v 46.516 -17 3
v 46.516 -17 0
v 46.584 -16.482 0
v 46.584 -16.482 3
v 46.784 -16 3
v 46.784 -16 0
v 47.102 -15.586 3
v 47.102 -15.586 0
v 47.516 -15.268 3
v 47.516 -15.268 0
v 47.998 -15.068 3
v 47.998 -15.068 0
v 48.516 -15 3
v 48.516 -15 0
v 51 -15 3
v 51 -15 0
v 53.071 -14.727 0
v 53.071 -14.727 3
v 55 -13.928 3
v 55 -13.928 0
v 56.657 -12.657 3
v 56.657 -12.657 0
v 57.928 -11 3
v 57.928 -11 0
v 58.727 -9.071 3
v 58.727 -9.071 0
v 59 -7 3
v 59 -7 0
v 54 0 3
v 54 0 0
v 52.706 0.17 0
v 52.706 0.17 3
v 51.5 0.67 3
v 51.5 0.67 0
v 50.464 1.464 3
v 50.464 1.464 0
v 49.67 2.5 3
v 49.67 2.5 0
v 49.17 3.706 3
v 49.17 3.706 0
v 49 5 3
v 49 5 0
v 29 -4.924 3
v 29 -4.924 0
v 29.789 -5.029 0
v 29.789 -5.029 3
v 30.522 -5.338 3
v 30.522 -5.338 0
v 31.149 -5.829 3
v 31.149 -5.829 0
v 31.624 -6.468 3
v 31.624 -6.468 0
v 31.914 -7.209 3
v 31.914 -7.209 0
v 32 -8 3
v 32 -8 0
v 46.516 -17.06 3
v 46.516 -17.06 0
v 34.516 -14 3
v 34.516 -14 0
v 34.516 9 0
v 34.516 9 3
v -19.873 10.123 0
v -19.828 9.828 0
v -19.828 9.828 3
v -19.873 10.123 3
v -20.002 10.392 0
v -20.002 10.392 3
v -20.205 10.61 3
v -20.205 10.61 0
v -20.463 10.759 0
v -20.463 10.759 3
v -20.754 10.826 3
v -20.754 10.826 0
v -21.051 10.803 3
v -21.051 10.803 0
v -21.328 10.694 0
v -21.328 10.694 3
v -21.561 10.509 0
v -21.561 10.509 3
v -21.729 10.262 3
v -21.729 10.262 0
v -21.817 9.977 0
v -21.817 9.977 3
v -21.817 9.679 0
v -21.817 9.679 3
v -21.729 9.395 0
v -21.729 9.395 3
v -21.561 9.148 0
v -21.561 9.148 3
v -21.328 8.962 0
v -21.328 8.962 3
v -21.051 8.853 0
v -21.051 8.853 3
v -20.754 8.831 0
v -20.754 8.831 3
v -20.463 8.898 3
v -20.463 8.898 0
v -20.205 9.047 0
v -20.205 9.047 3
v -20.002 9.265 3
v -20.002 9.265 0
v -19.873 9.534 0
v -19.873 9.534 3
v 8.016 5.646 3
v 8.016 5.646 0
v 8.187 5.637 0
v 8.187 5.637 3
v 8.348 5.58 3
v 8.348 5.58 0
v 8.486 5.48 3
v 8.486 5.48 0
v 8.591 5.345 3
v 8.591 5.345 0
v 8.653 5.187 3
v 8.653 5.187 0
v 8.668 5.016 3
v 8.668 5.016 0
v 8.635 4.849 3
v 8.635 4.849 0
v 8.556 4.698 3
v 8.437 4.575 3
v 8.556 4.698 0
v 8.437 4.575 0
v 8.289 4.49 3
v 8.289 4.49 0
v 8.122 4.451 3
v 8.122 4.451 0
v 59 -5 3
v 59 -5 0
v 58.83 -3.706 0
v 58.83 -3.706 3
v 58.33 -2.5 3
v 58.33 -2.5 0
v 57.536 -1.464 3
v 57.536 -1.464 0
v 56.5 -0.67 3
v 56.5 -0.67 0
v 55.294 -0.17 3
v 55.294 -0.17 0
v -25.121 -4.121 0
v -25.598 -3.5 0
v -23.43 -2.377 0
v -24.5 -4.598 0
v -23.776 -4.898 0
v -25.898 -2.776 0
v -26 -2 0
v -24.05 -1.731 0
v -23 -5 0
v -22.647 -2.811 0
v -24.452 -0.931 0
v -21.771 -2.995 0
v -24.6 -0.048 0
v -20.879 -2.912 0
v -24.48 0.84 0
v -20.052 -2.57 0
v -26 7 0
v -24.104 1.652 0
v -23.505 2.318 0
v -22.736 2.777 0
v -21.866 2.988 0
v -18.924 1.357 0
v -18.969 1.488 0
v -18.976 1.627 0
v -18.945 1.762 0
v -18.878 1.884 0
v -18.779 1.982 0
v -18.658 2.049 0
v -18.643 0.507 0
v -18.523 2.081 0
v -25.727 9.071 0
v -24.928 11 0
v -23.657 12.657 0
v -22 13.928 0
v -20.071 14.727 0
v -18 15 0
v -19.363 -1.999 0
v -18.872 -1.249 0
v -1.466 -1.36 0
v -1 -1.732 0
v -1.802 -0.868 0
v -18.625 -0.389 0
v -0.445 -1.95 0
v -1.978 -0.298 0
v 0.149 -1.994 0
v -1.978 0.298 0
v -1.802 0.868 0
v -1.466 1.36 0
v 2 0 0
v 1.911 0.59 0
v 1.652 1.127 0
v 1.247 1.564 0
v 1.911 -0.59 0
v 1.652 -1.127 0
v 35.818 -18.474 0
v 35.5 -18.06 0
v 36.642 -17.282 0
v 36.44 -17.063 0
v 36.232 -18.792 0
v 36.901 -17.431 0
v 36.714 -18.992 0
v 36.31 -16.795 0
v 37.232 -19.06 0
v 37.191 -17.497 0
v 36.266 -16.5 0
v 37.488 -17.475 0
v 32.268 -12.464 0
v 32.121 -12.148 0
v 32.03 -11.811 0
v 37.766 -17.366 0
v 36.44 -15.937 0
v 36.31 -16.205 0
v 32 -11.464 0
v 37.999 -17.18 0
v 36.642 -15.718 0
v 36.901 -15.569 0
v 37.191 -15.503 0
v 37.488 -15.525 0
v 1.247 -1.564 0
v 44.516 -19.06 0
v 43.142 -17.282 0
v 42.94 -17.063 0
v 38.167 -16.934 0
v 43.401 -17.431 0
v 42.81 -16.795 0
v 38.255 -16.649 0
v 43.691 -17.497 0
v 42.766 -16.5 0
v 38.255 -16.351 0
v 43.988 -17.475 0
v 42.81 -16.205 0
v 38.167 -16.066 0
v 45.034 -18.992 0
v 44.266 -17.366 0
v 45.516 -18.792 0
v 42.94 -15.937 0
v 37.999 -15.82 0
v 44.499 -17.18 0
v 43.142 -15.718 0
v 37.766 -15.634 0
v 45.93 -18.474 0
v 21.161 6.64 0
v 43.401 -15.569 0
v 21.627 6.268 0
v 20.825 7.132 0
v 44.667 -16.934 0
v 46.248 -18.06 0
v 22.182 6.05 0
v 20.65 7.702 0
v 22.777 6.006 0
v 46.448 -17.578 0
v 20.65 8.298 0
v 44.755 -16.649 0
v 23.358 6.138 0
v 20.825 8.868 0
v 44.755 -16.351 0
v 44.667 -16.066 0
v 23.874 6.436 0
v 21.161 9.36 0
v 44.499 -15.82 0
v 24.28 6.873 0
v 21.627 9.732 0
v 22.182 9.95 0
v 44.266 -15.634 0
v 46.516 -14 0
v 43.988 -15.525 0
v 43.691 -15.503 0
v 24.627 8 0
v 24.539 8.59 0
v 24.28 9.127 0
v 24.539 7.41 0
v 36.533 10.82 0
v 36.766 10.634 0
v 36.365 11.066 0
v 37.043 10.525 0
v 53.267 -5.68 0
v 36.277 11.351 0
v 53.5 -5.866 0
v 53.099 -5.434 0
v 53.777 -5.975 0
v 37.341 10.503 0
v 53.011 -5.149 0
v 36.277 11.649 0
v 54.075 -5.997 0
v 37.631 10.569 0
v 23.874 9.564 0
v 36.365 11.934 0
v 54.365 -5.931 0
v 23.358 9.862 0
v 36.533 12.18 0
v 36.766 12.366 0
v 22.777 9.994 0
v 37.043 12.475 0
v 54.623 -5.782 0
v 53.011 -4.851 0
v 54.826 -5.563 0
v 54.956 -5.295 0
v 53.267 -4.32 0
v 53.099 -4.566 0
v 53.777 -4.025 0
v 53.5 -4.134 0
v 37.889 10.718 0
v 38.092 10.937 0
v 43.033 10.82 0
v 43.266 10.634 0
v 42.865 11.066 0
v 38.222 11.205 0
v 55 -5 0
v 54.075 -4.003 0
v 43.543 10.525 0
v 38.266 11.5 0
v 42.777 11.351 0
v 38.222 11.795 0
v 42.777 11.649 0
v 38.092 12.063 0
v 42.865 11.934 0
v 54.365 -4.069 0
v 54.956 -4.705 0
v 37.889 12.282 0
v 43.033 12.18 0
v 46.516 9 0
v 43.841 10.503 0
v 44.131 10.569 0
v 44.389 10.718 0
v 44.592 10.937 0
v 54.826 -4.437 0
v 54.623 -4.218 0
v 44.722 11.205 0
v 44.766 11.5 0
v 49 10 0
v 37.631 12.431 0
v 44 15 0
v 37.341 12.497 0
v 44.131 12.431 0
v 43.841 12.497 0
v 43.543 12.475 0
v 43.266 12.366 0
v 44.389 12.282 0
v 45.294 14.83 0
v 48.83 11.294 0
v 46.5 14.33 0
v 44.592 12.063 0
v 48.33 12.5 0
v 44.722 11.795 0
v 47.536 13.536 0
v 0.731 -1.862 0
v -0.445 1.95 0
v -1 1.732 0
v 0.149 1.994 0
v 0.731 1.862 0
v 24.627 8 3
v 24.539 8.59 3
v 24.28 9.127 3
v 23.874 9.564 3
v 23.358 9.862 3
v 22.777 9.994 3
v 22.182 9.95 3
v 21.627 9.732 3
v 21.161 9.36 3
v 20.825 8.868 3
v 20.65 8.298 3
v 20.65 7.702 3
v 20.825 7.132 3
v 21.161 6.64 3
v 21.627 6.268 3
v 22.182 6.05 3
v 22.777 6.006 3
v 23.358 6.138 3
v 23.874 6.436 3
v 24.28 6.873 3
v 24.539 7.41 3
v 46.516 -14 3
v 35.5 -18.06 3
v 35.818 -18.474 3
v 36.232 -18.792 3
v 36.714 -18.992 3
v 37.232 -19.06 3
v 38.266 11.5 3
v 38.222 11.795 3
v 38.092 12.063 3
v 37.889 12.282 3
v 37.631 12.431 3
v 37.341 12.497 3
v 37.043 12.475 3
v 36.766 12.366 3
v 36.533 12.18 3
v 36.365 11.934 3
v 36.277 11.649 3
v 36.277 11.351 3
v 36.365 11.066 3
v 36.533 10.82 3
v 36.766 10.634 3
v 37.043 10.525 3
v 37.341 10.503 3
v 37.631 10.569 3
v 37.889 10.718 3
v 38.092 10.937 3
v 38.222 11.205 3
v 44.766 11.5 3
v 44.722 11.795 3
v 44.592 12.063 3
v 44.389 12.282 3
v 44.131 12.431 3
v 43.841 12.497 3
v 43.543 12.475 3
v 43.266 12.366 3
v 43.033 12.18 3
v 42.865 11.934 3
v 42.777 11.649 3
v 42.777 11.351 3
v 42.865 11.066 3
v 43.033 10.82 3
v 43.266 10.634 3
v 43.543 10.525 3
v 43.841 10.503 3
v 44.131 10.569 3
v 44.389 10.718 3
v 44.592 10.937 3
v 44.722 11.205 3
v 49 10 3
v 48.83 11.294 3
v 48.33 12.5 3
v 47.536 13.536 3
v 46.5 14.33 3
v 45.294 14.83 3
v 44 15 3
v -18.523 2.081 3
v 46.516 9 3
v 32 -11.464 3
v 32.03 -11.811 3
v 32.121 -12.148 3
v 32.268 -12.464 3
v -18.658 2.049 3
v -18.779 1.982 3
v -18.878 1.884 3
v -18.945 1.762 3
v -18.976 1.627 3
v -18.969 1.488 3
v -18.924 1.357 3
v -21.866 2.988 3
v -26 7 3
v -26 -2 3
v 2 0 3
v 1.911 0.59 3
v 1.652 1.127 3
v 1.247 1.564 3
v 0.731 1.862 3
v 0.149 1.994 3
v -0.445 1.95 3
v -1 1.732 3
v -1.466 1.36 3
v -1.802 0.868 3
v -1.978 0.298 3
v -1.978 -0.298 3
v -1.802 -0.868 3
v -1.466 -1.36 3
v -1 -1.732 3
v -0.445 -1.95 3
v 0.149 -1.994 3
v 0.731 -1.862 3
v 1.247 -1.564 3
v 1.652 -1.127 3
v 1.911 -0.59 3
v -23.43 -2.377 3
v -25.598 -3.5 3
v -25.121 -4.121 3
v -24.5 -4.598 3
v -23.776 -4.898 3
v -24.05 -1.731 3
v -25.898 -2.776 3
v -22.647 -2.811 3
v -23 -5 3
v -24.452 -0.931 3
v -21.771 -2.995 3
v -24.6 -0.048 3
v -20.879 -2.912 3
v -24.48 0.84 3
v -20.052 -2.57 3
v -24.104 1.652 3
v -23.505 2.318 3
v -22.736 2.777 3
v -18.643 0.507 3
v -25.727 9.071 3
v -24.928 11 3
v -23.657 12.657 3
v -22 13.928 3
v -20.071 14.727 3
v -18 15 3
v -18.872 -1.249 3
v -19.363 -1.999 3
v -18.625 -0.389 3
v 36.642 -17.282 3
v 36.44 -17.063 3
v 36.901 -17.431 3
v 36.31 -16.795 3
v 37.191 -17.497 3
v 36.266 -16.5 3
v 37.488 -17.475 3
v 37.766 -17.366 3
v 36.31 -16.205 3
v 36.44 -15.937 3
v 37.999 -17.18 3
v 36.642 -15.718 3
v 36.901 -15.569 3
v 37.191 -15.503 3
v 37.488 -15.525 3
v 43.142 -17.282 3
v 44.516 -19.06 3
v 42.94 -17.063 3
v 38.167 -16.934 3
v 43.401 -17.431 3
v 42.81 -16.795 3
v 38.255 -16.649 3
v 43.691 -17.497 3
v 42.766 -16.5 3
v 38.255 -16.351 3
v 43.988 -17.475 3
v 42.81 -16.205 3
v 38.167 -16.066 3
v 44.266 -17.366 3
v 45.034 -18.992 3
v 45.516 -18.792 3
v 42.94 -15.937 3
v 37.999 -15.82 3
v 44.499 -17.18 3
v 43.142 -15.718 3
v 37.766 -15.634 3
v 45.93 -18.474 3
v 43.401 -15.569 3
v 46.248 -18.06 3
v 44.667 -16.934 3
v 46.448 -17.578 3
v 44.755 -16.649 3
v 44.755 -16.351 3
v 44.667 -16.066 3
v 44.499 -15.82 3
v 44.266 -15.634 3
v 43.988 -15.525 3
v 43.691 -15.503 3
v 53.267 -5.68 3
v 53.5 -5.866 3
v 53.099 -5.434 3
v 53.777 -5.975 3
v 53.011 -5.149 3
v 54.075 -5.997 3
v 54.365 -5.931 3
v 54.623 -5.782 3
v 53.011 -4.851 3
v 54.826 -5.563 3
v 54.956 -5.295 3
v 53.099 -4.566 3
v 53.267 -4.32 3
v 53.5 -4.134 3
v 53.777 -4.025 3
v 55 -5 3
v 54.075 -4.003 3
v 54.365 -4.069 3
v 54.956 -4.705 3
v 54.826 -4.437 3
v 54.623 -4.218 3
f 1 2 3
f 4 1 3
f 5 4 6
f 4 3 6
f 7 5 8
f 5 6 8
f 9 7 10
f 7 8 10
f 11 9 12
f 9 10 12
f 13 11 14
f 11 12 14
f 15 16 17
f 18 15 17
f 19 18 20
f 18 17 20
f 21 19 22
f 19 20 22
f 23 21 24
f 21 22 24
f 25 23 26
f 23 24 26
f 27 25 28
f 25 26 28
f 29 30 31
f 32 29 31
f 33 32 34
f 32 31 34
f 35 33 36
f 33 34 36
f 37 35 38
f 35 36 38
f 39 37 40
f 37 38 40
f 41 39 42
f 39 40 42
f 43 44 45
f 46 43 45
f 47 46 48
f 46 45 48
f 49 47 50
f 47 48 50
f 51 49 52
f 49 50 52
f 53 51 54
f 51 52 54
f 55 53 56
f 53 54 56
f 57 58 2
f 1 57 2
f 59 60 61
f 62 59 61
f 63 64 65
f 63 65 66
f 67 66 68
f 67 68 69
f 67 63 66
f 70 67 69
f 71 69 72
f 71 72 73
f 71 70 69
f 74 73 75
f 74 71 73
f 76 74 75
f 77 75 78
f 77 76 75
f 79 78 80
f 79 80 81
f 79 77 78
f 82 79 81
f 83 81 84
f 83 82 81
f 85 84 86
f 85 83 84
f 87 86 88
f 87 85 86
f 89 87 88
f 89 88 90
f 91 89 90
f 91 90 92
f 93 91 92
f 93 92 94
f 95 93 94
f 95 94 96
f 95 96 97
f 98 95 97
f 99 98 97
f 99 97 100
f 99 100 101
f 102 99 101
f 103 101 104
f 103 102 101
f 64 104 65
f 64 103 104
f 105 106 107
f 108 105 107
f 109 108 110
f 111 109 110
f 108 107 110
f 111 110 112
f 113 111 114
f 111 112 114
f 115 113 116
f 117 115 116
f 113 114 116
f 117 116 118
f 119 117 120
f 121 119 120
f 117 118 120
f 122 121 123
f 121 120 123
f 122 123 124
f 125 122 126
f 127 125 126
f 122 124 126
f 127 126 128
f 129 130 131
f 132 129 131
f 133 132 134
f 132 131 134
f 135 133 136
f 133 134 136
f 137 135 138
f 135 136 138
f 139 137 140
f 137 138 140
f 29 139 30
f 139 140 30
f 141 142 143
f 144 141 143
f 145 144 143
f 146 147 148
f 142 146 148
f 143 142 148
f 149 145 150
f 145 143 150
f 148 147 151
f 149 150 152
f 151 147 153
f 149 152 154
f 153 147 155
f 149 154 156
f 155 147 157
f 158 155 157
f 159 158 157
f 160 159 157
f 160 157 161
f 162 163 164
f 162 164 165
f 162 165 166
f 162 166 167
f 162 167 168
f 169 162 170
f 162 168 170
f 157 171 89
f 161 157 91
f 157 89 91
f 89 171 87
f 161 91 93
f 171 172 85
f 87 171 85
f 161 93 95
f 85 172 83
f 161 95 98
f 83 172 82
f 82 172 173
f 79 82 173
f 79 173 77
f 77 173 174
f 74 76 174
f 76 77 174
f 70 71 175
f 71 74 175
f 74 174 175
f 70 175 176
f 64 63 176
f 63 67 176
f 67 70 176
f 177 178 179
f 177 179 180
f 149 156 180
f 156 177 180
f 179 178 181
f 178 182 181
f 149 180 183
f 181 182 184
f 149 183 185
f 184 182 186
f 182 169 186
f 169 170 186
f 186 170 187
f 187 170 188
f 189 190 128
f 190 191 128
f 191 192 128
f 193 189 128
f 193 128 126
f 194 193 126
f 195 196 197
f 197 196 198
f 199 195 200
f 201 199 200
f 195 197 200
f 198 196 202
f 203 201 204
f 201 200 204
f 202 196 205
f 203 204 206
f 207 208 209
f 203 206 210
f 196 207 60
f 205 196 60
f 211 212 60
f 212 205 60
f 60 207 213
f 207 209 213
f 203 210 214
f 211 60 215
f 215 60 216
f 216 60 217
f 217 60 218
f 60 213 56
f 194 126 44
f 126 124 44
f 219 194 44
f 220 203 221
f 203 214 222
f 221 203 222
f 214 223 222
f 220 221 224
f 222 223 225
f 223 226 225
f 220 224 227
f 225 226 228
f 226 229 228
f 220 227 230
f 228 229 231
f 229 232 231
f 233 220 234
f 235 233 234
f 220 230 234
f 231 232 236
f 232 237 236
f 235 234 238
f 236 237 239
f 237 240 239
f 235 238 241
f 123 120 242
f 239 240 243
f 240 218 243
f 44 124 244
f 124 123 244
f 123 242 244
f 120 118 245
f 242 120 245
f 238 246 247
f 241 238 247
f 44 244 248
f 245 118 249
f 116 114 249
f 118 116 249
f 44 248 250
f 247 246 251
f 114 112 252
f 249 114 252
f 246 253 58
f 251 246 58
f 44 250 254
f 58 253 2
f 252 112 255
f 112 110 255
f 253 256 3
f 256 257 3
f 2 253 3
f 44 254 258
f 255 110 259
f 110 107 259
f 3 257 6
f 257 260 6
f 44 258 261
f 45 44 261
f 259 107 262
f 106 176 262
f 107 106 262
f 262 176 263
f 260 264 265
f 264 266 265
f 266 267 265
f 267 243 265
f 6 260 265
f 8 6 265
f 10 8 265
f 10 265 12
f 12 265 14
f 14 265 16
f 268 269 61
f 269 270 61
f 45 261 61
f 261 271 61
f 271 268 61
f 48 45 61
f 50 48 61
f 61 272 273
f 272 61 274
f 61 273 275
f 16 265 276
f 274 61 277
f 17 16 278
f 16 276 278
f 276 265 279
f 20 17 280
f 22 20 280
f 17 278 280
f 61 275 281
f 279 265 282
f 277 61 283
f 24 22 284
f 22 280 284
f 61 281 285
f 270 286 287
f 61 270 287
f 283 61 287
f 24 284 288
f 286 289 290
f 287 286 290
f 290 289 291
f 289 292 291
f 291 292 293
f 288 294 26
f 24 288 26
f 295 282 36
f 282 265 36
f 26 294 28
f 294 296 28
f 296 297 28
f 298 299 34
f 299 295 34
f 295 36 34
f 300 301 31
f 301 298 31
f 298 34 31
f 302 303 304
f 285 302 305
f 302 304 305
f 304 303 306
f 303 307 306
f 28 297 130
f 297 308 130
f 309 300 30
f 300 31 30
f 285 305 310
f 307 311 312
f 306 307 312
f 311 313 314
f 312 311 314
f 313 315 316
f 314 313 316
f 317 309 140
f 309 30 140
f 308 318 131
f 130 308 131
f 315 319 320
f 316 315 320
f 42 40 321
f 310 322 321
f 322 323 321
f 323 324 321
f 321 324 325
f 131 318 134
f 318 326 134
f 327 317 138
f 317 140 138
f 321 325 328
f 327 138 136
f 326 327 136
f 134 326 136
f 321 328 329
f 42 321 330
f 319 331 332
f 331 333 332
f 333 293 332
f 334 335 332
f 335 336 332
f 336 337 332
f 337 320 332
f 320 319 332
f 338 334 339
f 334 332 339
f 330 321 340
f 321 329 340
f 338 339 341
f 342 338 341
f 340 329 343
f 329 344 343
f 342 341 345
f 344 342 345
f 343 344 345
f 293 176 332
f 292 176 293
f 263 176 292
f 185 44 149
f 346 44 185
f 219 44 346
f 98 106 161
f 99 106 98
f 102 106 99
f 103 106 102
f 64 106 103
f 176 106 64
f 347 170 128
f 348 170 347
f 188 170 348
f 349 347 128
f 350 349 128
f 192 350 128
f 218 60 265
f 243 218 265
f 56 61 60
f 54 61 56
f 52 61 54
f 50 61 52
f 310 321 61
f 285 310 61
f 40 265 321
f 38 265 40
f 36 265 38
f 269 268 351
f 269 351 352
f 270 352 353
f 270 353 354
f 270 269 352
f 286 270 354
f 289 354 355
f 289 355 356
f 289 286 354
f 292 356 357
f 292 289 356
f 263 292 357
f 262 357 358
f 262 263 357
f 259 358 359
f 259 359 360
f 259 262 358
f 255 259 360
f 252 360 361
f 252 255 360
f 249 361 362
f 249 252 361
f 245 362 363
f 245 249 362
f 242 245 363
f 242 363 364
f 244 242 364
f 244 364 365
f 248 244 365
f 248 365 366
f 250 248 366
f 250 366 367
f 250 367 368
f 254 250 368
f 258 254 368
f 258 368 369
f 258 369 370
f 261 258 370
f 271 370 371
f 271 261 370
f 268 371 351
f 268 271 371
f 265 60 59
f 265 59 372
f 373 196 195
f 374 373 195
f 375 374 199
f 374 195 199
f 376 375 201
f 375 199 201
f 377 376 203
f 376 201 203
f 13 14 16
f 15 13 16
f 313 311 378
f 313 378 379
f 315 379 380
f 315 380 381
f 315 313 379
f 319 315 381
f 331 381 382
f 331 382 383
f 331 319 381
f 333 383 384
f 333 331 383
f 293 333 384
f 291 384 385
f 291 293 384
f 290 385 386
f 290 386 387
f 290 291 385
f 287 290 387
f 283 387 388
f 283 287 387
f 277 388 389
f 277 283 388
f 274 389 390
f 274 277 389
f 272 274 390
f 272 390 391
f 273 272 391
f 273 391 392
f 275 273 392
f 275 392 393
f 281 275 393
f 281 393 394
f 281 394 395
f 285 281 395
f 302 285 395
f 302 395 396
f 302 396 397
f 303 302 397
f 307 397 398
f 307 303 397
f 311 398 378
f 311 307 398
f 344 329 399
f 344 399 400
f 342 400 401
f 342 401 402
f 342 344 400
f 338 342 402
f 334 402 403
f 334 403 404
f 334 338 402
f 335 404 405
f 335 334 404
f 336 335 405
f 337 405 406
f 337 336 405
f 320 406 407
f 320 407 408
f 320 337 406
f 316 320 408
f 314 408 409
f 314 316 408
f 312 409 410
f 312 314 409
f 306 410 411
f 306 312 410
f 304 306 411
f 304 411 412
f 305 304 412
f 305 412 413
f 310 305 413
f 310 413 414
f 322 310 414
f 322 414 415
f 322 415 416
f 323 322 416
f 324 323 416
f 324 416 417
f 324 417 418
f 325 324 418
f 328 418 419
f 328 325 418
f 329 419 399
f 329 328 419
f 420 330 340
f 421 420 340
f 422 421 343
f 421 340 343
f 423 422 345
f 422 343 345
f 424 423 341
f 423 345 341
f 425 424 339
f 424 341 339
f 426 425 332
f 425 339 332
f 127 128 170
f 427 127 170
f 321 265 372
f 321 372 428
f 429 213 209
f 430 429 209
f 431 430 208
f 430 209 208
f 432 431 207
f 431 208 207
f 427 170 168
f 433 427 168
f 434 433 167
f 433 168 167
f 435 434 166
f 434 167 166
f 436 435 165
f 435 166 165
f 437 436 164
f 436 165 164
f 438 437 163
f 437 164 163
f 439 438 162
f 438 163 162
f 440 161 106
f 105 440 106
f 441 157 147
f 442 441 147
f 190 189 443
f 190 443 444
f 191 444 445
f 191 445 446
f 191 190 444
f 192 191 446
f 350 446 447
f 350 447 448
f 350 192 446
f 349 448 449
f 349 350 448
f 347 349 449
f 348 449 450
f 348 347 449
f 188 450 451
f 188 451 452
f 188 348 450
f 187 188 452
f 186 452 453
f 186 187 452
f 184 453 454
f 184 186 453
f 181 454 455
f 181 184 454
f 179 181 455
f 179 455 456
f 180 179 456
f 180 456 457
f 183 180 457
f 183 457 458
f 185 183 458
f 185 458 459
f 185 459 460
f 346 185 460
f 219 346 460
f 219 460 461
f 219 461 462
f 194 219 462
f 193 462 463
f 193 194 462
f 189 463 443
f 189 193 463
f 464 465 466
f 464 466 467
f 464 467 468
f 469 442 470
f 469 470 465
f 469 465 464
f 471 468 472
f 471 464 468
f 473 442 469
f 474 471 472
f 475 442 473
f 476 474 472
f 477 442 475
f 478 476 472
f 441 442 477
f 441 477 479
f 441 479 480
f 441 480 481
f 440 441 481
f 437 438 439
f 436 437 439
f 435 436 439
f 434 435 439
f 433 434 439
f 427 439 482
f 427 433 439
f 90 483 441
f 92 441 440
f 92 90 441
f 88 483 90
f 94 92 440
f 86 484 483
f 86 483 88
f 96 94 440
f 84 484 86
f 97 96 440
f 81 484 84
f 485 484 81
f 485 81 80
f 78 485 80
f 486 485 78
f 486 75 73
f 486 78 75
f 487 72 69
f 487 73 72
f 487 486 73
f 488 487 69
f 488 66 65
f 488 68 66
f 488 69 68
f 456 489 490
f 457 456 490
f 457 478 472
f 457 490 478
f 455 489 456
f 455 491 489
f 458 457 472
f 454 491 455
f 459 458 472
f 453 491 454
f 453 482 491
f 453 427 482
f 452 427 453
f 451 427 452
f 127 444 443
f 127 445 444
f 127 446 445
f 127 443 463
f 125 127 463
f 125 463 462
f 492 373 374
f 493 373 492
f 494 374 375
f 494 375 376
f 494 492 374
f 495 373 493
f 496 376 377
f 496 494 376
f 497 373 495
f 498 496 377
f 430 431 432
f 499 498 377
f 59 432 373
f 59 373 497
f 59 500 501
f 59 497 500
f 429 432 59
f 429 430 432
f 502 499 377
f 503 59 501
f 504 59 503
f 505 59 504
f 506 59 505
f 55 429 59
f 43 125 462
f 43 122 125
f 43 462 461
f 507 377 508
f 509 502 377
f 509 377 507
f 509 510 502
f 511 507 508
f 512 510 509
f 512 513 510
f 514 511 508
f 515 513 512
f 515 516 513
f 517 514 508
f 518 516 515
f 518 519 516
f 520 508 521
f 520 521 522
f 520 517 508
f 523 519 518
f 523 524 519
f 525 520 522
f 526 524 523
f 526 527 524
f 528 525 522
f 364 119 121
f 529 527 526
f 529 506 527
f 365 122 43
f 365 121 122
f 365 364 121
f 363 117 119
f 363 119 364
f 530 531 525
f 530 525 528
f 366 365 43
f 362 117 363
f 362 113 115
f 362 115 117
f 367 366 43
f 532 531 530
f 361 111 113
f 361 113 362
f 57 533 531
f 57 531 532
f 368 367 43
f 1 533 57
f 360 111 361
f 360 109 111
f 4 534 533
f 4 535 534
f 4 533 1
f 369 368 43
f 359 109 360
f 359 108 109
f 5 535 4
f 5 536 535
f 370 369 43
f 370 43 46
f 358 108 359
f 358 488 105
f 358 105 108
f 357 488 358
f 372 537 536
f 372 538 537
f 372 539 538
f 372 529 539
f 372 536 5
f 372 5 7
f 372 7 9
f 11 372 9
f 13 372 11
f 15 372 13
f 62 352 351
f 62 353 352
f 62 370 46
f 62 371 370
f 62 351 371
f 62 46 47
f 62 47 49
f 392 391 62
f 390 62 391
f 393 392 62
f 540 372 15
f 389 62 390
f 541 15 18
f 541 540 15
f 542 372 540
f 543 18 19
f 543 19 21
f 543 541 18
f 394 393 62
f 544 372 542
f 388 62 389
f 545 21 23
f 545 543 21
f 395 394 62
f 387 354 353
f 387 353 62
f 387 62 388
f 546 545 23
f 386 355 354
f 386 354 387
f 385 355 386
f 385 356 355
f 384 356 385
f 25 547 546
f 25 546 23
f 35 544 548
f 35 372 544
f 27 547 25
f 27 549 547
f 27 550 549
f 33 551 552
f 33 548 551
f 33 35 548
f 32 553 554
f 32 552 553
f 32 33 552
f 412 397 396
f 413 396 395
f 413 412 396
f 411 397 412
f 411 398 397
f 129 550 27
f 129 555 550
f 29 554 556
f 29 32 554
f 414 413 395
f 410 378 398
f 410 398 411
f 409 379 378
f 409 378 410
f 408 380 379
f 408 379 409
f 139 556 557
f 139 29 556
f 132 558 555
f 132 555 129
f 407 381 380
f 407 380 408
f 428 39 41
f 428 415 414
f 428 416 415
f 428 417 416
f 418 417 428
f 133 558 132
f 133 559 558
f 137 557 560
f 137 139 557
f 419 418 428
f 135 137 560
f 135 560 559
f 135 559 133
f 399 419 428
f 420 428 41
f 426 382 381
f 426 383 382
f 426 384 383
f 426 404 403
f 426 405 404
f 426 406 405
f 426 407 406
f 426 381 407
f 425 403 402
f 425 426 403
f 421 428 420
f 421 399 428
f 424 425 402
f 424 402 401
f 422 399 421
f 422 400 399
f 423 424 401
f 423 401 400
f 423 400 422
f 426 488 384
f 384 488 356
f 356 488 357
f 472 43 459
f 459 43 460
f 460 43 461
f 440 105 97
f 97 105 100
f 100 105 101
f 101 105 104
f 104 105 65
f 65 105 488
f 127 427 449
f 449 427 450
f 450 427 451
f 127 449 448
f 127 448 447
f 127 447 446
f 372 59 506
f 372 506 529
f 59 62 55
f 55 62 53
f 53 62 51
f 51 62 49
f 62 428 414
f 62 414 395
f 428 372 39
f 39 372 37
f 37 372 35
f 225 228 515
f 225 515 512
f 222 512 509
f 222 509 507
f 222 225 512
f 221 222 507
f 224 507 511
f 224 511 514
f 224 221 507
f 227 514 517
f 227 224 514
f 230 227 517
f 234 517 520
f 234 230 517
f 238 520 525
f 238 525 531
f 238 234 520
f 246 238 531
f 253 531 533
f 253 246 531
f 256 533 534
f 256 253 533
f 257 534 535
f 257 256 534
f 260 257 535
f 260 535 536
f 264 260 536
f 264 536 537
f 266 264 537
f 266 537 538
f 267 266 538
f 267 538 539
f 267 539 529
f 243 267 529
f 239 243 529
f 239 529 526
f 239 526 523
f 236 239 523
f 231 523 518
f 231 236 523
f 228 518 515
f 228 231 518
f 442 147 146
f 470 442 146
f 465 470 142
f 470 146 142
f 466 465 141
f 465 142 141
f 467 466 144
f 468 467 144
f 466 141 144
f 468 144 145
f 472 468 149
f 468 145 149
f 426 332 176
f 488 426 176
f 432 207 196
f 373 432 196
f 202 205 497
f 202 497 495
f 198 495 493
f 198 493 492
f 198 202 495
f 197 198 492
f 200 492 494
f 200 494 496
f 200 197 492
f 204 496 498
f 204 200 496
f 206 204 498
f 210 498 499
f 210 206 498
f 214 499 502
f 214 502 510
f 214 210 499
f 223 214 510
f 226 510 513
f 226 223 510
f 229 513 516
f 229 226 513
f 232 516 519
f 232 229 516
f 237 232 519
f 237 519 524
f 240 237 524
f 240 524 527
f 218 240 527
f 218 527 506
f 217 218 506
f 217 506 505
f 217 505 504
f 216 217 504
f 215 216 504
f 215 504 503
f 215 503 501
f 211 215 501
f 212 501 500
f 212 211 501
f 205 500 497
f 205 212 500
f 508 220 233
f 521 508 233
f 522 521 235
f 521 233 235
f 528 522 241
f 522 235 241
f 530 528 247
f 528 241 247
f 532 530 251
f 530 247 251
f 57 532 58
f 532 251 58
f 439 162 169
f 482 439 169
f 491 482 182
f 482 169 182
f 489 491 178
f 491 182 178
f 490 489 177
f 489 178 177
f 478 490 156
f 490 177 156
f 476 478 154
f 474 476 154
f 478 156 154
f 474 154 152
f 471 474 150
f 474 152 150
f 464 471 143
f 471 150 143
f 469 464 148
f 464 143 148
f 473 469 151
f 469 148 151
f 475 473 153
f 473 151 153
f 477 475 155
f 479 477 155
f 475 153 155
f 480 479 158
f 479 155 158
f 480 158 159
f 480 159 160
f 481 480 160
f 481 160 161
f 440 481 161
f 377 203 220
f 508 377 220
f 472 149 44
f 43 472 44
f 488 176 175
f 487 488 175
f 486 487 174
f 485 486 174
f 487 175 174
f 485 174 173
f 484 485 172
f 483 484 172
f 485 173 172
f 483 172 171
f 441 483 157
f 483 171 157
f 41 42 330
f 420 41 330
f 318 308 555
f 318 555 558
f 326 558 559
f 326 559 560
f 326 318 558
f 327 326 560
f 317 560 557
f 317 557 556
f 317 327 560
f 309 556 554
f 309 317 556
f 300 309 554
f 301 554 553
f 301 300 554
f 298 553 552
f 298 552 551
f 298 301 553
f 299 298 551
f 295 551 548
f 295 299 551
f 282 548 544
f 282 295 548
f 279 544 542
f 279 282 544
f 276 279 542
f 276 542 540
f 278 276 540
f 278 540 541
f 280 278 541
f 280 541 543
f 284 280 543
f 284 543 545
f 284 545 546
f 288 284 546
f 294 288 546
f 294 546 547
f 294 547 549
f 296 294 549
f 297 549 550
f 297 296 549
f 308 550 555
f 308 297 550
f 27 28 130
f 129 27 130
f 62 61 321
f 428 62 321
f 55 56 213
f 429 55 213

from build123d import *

# Parameters (mm, degrees)
SKETCH_1_R      = 1
SKETCH_1_R_2    = 2
SKETCH_1_W      = 12
SKETCH_1_H      = 23
EXTRUDE_1_DEPTH = 3


with BuildPart() as part:
    # 草图1 → 凸台-拉伸1 (new body)
    with BuildSketch(Plane.XY):
        with BuildLine():
            Line((32, -8), (32, -11.464101615))
            ThreePointArc((32, -11.464101615), (32.068166714, -11.981729308), (32.268018761, -12.464061443))
            Line((32.268018761, -12.464061443), (35.500063979, -18.060190477))
            ThreePointArc((35.500063979, -18.060190477), (36.232094687, -18.7920566), (37.231964862, -19.059930845))
            Line((37.231964862, -19.059930845), (44.515960818, -19.059930845))
            ThreePointArc((44.515960818, -19.059930845), (45.93017438, -18.474144407), (46.515960818, -17.059930845))
            Line((46.515960818, -17.059930845), (46.515960818, -17))
            ThreePointArc((46.515960818, -17), (47.101747256, -15.585786438), (48.515960818, -15))
            Line((48.515960818, -15), (51, -15))
            ThreePointArc((51, -15), (56.656854249, -12.656854249), (59, -7))
            Line((59, -7), (59, -5))
            ThreePointArc((59, -5), (57.535533906, -1.464466094), (54, 0))
            ThreePointArc((54, 0), (50.464466094, 1.464466094), (49, 5))
            Line((49, 5), (49, 10))
            ThreePointArc((49, 10), (47.535533906, 13.535533906), (44, 15))
            Line((44, 15), (-18, 15))
            ThreePointArc((-18, 15), (-23.656854249, 12.656854249), (-26, 7))
            Line((-26, 7), (-26, -2))
            ThreePointArc((-26, -2), (-25.121320344, -4.121320344), (-23, -5))
            Line((-23, -5), (28.999778597, -4.924134531))
            ThreePointArc((28.999778597, -4.924134531), (31.148522662, -5.829385596), (32, -8))
        make_face()
        with Locations((-20.828427125, 9.828427125)):
            Circle(SKETCH_1_R, mode=Mode.SUBTRACT)
        Circle(SKETCH_1_R_2, mode=Mode.SUBTRACT)
        with Locations((22.627416998, 8)):
            Circle(SKETCH_1_R_2, mode=Mode.SUBTRACT)
        with Locations((37.265960818, 11.5)):
            Circle(SKETCH_1_R, mode=Mode.SUBTRACT)
        with Locations((43.765960818, 11.5)):
            Circle(SKETCH_1_R, mode=Mode.SUBTRACT)
        with Locations((54, -5)):
            Circle(SKETCH_1_R, mode=Mode.SUBTRACT)
        with Locations(Location((43.765960818, -16.5, 0), (0, 0, 180))):
            Circle(SKETCH_1_R, mode=Mode.SUBTRACT)
        with Locations(Location((37.265960818, -16.5, 0), (0, 0, 180))):
            Circle(SKETCH_1_R, mode=Mode.SUBTRACT)
        with Locations((40.515960818, -2.5)):
            Rectangle(SKETCH_1_W, SKETCH_1_H, mode=Mode.SUBTRACT)
        with BuildLine():
            Line((-21.865827163, 2.988199444), (8.016167282, 5.646471071))
            ThreePointArc((8.016167282, 5.646471071), (8.666972603, 5.101996614), (8.122498147, 4.451191293))
            Line((8.122498147, 4.451191293), (-18.522663358, 2.08086501))
            ThreePointArc((-18.522663358, 2.08086501), (-18.915607181, 1.825347502), (-18.924307569, 1.356712945))
            ThreePointArc((-18.924307569, 1.356712945), (-23.055094396, -2.623490099), (-21.865827163, 2.988199444))
        make_face(mode=Mode.SUBTRACT)
    extrude(amount=EXTRUDE_1_DEPTH)


solid = part.part
